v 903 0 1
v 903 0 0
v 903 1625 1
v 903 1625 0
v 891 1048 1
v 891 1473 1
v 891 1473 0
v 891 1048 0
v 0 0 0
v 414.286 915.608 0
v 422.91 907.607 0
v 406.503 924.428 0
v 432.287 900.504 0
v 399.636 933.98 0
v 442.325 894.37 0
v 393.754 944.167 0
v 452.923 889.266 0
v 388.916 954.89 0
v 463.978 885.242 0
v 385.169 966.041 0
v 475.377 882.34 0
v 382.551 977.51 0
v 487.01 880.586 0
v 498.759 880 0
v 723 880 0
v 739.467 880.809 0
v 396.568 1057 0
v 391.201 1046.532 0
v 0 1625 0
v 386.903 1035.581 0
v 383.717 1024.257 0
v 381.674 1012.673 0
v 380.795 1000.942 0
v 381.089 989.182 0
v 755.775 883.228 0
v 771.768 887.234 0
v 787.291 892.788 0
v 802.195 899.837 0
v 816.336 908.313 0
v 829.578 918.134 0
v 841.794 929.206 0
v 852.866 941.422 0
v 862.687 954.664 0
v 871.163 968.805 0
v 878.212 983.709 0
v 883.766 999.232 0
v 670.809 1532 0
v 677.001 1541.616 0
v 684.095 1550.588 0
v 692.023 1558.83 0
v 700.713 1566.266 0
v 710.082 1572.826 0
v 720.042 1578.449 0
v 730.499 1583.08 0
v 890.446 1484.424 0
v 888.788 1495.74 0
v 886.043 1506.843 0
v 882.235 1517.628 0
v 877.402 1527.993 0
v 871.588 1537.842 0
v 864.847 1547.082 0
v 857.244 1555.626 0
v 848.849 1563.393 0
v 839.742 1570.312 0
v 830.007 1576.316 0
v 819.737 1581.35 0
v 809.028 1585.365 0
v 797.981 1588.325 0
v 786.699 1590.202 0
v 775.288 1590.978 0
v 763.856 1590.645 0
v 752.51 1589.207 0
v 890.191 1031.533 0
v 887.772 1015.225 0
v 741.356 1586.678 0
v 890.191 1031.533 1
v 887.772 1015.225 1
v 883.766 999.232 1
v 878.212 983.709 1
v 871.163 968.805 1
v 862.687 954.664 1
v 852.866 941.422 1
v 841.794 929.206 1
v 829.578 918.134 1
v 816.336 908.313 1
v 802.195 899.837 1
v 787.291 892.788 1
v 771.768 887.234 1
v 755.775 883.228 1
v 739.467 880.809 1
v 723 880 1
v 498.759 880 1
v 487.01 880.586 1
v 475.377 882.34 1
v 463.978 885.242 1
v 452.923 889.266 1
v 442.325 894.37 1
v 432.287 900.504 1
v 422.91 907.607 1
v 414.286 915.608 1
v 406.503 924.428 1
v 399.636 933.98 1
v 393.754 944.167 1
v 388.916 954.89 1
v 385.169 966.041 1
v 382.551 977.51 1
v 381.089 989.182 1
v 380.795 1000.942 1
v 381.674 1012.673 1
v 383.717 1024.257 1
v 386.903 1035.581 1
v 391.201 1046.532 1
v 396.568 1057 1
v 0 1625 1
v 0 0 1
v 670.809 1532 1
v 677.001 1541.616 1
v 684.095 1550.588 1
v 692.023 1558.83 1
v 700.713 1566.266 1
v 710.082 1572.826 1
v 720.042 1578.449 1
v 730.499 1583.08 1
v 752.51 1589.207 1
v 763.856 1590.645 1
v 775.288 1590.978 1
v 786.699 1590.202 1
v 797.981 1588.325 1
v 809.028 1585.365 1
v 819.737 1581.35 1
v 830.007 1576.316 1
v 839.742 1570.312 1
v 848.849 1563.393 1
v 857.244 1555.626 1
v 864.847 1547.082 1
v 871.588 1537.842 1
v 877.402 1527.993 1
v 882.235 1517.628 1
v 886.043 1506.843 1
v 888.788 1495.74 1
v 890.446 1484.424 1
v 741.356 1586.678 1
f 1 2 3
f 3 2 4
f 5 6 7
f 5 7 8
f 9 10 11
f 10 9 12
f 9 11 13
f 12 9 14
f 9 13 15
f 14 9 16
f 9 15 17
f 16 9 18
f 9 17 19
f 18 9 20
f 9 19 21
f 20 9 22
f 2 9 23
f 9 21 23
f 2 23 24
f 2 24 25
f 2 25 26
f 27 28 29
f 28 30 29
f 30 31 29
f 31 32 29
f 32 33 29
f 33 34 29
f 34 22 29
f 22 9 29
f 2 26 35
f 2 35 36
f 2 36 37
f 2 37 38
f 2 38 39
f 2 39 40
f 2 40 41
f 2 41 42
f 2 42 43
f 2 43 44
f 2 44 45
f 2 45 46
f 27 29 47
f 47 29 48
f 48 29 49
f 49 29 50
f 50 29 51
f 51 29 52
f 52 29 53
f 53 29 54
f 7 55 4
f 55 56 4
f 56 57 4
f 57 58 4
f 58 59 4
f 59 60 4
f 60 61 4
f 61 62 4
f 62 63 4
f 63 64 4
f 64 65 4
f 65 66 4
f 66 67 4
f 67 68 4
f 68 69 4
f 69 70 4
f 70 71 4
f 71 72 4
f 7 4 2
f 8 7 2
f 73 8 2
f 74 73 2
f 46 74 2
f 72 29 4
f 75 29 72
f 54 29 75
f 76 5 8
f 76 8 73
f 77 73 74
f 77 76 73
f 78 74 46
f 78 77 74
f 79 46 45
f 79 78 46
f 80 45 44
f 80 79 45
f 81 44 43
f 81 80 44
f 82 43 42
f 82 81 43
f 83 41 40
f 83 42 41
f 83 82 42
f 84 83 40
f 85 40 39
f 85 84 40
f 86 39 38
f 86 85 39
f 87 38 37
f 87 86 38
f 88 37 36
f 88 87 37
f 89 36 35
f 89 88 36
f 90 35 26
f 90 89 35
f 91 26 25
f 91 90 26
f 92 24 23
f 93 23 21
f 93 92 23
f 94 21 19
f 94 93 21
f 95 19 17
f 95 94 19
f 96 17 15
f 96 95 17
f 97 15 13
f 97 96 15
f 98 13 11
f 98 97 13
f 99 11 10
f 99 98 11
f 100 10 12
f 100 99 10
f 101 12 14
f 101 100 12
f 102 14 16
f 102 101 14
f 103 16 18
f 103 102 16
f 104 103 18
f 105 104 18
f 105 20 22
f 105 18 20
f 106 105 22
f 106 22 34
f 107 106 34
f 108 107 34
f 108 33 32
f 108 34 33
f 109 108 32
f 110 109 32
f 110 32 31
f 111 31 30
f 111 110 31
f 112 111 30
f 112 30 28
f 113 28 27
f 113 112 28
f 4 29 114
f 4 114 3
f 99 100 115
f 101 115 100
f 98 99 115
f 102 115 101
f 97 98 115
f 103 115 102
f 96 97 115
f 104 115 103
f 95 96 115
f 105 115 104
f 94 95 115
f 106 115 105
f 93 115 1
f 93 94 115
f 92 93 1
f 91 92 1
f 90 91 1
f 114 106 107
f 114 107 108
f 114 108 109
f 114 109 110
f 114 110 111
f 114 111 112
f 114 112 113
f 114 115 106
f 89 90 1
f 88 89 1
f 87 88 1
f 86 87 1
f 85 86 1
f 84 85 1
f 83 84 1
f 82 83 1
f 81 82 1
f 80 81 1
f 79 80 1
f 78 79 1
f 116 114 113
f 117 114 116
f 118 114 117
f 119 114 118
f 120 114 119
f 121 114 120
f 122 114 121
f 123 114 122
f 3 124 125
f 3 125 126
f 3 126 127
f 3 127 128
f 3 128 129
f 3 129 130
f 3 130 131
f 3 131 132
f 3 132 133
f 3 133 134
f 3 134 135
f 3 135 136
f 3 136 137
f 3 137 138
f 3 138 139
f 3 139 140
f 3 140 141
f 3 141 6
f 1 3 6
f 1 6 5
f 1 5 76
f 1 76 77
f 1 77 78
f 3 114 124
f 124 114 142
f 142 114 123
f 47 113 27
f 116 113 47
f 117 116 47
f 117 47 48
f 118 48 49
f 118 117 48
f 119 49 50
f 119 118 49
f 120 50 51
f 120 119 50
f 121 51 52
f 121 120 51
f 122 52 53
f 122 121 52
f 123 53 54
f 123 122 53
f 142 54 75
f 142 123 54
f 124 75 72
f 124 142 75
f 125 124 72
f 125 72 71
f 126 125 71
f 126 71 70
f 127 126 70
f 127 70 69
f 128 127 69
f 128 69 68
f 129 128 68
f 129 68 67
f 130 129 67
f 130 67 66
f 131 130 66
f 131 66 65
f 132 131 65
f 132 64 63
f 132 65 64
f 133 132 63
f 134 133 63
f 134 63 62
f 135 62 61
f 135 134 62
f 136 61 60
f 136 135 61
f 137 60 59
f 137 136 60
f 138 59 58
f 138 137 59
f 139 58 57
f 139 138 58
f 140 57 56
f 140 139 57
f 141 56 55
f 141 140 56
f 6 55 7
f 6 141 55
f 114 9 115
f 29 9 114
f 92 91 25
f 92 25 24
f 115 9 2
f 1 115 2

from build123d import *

# Parameters (mm, degrees)
SKETCH1_W           = 903
SKETCH1_H           = 1625
BOSS_EXTRUDE1_DEPTH = 1
CUT_EXTRUDE1_DEPTH  = 1957.486620094


with BuildPart() as part:
    # Sketch1 → Boss-Extrude1 (new body)
    with BuildSketch(Plane.XY):
        with Locations((451.5, 812.5)):
            Rectangle(SKETCH1_W, SKETCH1_H)
    extrude(amount=BOSS_EXTRUDE1_DEPTH)

    # Sketch2 → Cut-Extrude1 (cut, through all)
    with BuildSketch(Plane(origin=(-119.436638294, -43.071405931, 1), x_dir=(1, 0, 0), z_dir=(0, 0, 1))):
        with BuildLine():
            Line((1010.436638294, 1516.071405931), (1010.436638294, 1091.071405931))
            ThreePointArc((1010.436638294, 1091.071405931), (961.230577533, 972.277466691), (842.436638294, 923.071405931))
            Line((842.436638294, 923.071405931), (618.195260429, 923.071405931))
            ThreePointArc((618.195260429, 923.071405931), (516.004262782, 982.071405931), (516.004262782, 1100.071405931))
            Line((516.004262782, 1100.071405931), (790.245640647, 1575.071405931))
            ThreePointArc((790.245640647, 1575.071405931), (922.977285616, 1630.050653433), (1010.436638294, 1516.071405931))
        make_face()
    extrude(amount=-CUT_EXTRUDE1_DEPTH, mode=Mode.SUBTRACT)


solid = part.part
